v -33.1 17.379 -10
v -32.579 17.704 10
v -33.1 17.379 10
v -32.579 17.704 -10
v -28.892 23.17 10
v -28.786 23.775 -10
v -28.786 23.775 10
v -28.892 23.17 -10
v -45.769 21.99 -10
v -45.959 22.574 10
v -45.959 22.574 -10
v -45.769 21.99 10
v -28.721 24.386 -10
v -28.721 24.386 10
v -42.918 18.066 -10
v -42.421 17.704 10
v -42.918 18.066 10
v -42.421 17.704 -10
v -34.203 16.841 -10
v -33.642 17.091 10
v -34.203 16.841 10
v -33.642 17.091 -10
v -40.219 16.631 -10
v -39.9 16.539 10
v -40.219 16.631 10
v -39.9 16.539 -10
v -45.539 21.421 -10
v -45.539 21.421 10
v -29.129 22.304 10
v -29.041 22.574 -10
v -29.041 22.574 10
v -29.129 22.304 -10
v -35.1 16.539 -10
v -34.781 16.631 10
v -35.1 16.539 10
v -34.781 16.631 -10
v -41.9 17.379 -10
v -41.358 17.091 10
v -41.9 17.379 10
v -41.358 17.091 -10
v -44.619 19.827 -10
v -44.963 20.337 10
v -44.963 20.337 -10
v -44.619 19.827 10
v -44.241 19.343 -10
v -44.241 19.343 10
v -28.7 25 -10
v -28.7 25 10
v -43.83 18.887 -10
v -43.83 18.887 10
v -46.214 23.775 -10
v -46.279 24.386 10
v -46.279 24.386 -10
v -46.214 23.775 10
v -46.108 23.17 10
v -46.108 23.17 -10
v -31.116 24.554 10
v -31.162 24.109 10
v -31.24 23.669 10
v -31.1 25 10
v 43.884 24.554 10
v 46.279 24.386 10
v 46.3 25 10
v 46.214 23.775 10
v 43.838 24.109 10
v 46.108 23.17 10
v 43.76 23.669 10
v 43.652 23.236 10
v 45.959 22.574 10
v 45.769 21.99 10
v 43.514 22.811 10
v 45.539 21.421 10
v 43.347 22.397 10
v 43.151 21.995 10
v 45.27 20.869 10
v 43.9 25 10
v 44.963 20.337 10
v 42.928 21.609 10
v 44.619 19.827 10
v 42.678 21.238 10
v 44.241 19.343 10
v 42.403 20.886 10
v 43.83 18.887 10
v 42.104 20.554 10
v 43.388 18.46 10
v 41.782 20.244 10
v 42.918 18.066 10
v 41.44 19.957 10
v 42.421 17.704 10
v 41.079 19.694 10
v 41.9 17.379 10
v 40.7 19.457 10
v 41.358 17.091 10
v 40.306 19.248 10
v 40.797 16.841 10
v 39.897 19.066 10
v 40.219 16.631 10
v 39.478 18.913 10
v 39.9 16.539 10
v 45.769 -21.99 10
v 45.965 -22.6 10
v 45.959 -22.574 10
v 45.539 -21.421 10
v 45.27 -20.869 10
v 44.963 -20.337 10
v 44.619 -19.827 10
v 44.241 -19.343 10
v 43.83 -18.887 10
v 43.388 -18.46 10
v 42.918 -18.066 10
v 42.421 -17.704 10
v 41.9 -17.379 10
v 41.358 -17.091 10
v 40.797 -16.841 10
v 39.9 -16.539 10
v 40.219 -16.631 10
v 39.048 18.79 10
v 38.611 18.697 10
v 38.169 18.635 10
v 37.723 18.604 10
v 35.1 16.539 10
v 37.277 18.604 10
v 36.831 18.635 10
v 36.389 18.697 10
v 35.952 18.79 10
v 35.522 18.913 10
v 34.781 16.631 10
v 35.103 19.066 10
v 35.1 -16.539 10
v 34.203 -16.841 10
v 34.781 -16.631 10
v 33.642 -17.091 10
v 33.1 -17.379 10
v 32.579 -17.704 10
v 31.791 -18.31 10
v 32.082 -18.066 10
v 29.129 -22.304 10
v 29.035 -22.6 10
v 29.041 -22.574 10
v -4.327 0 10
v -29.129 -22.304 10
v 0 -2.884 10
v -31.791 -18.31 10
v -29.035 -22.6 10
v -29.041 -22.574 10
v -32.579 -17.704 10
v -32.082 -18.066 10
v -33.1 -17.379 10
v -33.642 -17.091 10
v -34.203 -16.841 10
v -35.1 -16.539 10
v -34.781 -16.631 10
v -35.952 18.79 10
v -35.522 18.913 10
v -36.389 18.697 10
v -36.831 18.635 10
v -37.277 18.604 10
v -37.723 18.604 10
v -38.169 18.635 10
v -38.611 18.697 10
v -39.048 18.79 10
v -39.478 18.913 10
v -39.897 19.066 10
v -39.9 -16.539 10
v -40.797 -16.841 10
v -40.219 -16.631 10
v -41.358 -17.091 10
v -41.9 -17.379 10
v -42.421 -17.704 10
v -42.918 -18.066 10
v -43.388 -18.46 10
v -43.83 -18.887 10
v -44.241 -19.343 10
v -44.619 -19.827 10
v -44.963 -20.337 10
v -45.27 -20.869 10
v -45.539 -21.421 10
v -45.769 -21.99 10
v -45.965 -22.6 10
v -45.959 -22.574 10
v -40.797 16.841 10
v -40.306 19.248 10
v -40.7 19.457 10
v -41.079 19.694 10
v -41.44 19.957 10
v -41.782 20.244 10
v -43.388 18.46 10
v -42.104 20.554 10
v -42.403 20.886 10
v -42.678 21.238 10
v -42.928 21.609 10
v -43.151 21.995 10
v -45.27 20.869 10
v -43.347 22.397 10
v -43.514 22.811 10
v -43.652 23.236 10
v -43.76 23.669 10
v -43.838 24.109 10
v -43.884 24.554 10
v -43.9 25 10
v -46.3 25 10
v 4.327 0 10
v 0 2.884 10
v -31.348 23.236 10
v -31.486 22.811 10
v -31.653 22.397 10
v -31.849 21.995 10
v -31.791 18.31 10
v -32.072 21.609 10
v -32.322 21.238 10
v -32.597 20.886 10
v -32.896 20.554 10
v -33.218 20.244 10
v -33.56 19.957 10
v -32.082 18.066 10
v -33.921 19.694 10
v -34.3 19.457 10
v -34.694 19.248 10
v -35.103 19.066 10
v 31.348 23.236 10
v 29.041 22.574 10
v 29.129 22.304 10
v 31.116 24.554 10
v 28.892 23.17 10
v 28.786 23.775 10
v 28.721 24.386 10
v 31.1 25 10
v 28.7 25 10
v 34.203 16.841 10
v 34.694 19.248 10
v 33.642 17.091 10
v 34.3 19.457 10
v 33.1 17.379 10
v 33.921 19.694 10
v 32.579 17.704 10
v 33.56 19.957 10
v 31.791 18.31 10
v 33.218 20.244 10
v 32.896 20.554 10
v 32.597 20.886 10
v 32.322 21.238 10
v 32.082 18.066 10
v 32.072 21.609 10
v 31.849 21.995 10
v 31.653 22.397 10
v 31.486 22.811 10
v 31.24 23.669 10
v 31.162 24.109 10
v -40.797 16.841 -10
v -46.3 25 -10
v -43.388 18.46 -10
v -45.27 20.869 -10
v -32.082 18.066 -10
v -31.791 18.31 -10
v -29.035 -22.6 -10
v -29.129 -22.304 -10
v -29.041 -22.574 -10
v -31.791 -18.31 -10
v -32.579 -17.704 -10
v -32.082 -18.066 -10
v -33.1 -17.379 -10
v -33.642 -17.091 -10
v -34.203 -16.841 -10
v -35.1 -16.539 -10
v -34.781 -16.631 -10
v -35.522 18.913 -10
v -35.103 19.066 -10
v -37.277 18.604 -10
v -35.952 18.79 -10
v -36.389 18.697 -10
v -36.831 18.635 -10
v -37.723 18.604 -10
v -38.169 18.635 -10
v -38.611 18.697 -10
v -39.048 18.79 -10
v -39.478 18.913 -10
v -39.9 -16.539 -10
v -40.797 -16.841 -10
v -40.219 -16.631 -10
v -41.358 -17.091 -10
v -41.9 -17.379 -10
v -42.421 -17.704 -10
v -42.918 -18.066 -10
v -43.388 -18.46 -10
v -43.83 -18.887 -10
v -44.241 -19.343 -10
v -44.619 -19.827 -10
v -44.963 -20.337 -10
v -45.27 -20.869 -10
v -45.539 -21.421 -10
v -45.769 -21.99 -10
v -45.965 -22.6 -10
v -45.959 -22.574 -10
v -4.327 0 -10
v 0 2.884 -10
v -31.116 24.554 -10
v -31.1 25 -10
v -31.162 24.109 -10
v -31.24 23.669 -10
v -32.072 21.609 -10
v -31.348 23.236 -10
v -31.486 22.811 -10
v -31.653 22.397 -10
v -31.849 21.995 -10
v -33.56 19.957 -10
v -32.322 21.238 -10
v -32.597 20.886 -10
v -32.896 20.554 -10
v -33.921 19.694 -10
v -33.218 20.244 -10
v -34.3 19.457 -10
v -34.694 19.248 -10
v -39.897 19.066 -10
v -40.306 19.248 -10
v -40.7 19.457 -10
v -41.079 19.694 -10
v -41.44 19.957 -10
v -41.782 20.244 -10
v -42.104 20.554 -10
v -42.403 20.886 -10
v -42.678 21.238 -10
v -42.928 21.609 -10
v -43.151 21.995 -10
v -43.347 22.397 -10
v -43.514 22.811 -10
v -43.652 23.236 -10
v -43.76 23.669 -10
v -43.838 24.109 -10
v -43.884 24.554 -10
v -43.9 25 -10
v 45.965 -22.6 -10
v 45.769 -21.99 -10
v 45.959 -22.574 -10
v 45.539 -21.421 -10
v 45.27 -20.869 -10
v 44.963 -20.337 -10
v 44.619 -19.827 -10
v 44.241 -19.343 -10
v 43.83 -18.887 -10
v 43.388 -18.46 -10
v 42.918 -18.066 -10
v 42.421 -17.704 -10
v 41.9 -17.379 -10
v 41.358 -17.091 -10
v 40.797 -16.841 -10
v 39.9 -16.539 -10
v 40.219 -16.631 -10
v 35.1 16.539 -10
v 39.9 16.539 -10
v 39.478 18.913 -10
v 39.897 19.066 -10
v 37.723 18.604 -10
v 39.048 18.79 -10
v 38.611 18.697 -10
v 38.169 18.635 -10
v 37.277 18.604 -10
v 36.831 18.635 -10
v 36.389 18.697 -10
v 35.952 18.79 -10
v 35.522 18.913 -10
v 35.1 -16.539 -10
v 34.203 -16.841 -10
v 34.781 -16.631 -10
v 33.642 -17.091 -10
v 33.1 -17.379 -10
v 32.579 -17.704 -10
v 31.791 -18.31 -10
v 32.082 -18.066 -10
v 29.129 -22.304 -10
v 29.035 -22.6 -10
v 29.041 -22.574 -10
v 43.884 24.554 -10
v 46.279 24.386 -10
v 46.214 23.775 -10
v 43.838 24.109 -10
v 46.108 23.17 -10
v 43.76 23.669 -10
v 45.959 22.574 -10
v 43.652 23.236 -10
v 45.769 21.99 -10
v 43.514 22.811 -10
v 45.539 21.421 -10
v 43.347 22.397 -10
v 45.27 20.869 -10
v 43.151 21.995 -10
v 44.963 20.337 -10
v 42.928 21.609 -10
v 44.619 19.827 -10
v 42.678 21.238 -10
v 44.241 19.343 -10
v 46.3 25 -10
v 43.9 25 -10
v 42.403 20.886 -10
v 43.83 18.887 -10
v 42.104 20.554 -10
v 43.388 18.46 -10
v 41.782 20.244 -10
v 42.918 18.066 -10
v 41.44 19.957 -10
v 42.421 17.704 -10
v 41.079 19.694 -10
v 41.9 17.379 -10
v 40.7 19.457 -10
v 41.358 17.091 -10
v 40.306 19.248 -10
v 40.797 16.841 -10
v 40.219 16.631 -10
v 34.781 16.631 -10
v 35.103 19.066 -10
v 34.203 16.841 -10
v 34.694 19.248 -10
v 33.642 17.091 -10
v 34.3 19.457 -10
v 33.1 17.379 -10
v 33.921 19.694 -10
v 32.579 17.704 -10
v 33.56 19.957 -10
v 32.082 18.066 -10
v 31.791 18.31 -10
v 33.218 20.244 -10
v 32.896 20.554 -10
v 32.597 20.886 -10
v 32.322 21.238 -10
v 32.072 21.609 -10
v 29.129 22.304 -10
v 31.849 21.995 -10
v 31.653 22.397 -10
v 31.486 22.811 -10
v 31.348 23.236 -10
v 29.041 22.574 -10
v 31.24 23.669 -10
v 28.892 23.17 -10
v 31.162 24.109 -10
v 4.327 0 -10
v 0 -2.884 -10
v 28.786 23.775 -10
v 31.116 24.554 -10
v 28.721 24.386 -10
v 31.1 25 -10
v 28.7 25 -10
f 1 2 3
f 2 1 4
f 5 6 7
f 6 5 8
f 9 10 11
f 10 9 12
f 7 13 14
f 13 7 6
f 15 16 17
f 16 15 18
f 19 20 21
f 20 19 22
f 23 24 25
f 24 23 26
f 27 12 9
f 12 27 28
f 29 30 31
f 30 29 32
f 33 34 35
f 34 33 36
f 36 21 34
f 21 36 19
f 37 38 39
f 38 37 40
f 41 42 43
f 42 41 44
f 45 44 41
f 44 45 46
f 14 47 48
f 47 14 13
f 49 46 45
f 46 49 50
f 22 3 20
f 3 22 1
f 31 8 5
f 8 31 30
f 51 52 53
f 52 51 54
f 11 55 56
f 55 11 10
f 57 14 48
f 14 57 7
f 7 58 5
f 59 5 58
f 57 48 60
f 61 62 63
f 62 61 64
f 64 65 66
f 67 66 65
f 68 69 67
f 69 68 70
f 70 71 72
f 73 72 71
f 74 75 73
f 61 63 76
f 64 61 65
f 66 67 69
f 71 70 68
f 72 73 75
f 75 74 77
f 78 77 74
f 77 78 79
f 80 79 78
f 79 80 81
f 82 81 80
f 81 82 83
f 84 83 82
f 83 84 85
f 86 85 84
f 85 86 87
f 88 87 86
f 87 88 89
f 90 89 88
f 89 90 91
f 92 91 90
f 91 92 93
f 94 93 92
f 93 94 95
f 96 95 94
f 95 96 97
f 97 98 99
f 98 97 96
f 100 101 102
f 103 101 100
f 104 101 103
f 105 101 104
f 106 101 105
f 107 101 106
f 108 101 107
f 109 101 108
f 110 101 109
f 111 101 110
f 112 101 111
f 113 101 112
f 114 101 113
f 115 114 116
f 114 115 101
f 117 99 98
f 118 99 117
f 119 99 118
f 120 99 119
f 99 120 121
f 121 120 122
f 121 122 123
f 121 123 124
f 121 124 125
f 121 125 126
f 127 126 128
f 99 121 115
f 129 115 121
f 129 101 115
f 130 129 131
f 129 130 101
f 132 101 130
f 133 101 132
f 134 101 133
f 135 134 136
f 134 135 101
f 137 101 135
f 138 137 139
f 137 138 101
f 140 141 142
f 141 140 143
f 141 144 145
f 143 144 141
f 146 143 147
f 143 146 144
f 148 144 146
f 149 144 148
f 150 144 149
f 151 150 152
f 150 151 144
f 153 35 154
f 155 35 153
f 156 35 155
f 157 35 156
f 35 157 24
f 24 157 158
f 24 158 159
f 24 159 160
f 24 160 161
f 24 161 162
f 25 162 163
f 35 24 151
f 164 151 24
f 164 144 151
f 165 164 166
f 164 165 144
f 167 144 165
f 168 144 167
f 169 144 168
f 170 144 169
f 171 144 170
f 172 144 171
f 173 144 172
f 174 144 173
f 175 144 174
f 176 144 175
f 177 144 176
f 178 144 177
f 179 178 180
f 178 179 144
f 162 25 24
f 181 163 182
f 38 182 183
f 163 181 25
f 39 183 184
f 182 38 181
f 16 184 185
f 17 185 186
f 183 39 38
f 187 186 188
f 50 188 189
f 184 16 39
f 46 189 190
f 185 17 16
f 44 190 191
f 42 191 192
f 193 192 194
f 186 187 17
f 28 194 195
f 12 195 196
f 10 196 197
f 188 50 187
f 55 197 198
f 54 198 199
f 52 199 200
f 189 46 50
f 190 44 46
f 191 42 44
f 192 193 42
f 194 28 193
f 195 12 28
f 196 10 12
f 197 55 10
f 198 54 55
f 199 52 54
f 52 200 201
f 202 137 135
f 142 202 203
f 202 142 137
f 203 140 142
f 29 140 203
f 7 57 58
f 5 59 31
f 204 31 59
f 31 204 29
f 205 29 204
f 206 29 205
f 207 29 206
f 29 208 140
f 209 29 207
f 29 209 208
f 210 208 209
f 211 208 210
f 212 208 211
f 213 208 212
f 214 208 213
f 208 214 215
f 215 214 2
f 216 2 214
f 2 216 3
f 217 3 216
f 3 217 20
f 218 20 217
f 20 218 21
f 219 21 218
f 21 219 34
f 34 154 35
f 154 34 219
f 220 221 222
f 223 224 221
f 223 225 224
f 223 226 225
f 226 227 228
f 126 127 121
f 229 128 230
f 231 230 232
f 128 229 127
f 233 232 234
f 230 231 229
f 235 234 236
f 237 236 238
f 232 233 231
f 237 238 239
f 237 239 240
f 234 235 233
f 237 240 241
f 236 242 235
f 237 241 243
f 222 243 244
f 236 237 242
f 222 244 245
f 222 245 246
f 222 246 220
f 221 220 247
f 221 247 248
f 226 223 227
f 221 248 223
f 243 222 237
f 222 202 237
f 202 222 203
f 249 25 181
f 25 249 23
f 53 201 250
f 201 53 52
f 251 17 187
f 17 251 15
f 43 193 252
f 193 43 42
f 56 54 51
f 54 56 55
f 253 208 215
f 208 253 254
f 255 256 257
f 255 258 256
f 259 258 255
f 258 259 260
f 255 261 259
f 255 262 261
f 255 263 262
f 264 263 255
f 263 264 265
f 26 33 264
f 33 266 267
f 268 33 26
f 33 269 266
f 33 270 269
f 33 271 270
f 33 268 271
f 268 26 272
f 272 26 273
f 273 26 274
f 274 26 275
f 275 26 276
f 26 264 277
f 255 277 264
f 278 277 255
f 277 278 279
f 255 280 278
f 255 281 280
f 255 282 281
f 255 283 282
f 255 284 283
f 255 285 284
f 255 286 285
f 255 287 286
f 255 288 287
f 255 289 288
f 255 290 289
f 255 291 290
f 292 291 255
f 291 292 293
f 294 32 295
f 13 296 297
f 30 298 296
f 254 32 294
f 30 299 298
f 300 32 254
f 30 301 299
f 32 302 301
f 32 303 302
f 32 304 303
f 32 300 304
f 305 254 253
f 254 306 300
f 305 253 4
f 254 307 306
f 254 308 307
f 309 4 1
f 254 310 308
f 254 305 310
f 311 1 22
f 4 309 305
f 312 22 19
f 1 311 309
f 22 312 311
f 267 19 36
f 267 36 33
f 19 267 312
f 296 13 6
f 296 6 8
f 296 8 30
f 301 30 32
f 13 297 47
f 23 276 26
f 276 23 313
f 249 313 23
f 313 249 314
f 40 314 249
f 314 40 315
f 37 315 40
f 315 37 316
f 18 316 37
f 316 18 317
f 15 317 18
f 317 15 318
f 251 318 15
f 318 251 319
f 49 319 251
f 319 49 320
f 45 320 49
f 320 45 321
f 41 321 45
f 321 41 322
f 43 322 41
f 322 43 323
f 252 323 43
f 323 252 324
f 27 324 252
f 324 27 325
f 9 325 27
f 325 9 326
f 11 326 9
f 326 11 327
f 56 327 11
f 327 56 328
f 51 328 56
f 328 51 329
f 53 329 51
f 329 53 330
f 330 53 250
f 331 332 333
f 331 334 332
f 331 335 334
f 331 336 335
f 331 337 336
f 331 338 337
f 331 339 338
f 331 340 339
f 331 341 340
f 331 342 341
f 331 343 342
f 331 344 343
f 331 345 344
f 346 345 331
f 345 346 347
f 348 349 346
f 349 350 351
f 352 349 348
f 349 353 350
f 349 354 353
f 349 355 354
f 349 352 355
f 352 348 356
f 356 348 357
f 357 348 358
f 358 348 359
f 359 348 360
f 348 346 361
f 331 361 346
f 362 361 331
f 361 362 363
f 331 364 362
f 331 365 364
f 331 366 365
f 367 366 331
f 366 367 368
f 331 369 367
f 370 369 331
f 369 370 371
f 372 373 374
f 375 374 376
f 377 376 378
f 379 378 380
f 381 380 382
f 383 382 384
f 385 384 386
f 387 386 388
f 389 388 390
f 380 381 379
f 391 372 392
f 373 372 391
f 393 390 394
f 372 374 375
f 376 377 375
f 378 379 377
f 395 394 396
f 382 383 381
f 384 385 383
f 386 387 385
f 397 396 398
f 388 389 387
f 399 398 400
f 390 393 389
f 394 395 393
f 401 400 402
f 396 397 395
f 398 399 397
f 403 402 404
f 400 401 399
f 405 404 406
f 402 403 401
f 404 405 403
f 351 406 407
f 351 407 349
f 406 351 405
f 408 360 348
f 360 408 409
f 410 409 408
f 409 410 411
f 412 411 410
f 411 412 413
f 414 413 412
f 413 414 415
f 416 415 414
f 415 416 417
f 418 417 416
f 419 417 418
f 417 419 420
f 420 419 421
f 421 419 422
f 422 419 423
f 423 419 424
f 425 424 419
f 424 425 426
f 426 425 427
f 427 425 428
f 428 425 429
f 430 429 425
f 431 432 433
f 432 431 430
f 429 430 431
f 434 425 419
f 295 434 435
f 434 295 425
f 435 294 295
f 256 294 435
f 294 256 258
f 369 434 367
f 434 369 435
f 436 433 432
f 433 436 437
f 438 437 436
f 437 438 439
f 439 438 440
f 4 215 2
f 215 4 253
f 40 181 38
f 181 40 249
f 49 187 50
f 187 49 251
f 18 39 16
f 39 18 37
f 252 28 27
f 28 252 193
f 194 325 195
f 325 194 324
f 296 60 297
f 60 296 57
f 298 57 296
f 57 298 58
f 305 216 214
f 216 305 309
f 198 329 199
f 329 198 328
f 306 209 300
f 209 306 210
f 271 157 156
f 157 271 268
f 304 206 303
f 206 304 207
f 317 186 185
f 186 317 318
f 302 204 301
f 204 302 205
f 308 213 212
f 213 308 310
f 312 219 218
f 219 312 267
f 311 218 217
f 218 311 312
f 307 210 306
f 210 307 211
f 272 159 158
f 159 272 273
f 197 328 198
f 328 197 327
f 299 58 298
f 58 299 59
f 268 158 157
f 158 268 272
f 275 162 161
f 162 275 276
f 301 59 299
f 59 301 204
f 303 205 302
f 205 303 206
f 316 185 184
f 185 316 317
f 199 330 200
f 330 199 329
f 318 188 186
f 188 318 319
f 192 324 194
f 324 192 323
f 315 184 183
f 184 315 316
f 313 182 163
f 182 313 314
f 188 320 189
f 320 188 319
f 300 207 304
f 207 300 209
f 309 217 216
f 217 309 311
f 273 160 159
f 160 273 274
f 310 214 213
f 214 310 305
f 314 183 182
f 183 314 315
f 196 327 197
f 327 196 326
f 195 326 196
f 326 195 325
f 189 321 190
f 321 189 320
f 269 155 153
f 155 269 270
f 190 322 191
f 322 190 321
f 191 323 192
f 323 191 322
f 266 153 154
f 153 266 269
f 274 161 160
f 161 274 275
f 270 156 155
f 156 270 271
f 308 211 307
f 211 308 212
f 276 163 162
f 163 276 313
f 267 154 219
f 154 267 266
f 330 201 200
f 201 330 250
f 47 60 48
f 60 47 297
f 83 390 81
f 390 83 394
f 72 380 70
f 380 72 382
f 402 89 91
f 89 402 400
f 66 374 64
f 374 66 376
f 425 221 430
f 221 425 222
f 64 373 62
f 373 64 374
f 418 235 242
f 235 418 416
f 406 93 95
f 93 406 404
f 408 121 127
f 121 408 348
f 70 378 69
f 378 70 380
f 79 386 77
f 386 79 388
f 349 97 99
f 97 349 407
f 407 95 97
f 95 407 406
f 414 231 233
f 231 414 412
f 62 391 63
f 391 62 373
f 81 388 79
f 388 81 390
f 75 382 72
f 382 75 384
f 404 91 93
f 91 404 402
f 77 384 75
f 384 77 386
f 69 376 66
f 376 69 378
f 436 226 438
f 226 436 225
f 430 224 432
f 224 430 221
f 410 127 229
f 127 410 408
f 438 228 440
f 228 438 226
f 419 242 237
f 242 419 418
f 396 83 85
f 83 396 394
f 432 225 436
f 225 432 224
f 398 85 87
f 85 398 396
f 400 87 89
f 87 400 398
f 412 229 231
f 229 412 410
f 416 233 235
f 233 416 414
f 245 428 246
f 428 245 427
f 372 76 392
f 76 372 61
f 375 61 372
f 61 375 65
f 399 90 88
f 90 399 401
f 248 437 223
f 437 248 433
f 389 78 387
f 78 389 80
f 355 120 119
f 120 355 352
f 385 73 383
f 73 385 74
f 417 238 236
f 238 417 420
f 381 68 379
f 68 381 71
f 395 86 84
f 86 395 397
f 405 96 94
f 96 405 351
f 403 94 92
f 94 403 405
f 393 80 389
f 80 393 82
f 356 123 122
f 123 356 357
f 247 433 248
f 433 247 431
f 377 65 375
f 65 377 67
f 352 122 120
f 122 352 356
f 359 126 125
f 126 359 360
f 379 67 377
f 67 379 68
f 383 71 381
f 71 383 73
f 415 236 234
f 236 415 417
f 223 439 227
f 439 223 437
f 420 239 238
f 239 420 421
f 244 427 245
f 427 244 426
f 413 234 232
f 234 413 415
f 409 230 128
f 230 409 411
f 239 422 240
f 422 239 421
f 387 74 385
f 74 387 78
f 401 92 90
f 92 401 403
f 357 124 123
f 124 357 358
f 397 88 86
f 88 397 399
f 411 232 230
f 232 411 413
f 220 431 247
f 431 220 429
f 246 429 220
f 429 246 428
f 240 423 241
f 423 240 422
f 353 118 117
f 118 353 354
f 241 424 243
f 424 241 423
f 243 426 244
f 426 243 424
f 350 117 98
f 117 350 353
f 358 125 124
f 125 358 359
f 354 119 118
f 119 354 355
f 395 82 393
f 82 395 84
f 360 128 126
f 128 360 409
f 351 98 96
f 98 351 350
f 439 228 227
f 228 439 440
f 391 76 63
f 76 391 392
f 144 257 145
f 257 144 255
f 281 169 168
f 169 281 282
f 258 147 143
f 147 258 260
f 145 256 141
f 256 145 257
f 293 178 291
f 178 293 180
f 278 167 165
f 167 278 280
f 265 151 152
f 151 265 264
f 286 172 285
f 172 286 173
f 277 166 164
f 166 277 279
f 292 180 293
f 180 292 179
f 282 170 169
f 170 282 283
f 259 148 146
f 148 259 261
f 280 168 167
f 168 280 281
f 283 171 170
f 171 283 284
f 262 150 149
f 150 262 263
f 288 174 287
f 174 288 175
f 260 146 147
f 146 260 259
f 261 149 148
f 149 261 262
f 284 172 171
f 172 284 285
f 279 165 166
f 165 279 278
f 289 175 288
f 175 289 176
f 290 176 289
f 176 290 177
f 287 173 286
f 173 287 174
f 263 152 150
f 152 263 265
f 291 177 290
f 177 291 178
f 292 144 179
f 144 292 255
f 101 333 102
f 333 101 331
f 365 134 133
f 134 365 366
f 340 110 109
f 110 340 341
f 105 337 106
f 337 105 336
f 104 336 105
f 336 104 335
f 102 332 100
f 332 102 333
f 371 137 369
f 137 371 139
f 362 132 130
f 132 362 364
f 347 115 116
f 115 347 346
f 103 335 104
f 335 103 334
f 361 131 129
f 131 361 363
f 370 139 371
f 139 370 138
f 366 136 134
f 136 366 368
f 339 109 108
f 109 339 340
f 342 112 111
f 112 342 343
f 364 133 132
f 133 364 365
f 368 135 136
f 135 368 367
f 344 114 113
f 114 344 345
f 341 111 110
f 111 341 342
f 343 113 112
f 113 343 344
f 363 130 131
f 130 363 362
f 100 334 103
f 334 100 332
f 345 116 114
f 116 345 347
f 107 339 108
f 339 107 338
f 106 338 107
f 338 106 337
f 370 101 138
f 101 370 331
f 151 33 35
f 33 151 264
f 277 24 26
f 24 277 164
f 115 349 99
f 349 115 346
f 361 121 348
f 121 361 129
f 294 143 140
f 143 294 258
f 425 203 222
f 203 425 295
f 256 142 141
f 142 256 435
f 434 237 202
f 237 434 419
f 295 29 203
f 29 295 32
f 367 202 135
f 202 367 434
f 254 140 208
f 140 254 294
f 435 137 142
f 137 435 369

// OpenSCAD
// file: _common.scad
$fa=4; // default minimum facet angle is now 0.5
$fs=0.05; // default minimum facet size is now 0.05 mm

holeRad = 6.4;
wallThickness = 2.4;
insertDepth = 20;
offsetDepth = 7;
screwHoleDiam = 4.75;
countersinkDiam = 9;
footHeight = 10;
distanceFromWall = 38 - holeRad;


module chamferedScrewHole(rh, rs, d, ds, t = .1) {
  translate([0, 0, -t]) cylinder(r=rs, h=d + t);
  translate([0, 0, d - ds + t]) cylinder(r1=rs, r2=rh, h=ds + t);
  translate([0, 0, d - ds + 2*t + ds - .01]) cylinder(r=rh, h=ds + t + 5);
}
// main file
include <_common.scad>

barGap = 75;
rackHeight = 50; 

translate([0, rackHeight / 2, 0]) for (i = [-1:2:1]) {
  translate([i * (barGap / 2), 0, 0]) difference() {
    rotate([0, 0, 0]) cylinder(h = (insertDepth), r = holeRad + wallThickness, center = true);
    translate([0, 0, 0]) cylinder(h = (insertDepth) + .2, r = holeRad, center = true);
    translate([-holeRad - wallThickness, 0, -insertDepth / 2 - .5]) cube([(holeRad + wallThickness) * 2, (holeRad + wallThickness * 2), insertDepth + 1]);
  }
}

translate([0, -rackHeight / 2, 0]) for (i = [-1:2:1]) {
  translate([i * (barGap / 2), 0, 0]) difference() {
    rotate([0, 0, 0]) cylinder(h = (insertDepth), r = holeRad + wallThickness, center = true);
    translate([-holeRad - wallThickness, -holeRad - wallThickness, -insertDepth / 2 - .5]) cube([(holeRad + wallThickness) * 2, (holeRad + wallThickness * 2), insertDepth + 1]);
  }
}

translate([-barGap / 2 - wallThickness, (rackHeight - holeRad * 2 + wallThickness) / -2, insertDepth / -2]) cube([wallThickness * 2, rackHeight - holeRad * 2, insertDepth]);
translate([barGap / 2 - wallThickness, (rackHeight - holeRad * 2 + wallThickness) / -2, insertDepth / -2]) cube([wallThickness * 2, rackHeight - holeRad * 2, insertDepth]);

crossmemberLength = sqrt(pow(barGap, 2) + pow(rackHeight, 2)) - holeRad * 2 - wallThickness * 1.5;
rotate([0, 0, atan(rackHeight / barGap)]) translate([crossmemberLength / -2, -wallThickness, -insertDepth / 2]) cube([crossmemberLength, wallThickness * 2, insertDepth]);
rotate([0, 0, -atan(rackHeight / barGap)]) translate([crossmemberLength / -2, -wallThickness, -insertDepth / 2]) cube([crossmemberLength, wallThickness * 2, insertDepth]);
